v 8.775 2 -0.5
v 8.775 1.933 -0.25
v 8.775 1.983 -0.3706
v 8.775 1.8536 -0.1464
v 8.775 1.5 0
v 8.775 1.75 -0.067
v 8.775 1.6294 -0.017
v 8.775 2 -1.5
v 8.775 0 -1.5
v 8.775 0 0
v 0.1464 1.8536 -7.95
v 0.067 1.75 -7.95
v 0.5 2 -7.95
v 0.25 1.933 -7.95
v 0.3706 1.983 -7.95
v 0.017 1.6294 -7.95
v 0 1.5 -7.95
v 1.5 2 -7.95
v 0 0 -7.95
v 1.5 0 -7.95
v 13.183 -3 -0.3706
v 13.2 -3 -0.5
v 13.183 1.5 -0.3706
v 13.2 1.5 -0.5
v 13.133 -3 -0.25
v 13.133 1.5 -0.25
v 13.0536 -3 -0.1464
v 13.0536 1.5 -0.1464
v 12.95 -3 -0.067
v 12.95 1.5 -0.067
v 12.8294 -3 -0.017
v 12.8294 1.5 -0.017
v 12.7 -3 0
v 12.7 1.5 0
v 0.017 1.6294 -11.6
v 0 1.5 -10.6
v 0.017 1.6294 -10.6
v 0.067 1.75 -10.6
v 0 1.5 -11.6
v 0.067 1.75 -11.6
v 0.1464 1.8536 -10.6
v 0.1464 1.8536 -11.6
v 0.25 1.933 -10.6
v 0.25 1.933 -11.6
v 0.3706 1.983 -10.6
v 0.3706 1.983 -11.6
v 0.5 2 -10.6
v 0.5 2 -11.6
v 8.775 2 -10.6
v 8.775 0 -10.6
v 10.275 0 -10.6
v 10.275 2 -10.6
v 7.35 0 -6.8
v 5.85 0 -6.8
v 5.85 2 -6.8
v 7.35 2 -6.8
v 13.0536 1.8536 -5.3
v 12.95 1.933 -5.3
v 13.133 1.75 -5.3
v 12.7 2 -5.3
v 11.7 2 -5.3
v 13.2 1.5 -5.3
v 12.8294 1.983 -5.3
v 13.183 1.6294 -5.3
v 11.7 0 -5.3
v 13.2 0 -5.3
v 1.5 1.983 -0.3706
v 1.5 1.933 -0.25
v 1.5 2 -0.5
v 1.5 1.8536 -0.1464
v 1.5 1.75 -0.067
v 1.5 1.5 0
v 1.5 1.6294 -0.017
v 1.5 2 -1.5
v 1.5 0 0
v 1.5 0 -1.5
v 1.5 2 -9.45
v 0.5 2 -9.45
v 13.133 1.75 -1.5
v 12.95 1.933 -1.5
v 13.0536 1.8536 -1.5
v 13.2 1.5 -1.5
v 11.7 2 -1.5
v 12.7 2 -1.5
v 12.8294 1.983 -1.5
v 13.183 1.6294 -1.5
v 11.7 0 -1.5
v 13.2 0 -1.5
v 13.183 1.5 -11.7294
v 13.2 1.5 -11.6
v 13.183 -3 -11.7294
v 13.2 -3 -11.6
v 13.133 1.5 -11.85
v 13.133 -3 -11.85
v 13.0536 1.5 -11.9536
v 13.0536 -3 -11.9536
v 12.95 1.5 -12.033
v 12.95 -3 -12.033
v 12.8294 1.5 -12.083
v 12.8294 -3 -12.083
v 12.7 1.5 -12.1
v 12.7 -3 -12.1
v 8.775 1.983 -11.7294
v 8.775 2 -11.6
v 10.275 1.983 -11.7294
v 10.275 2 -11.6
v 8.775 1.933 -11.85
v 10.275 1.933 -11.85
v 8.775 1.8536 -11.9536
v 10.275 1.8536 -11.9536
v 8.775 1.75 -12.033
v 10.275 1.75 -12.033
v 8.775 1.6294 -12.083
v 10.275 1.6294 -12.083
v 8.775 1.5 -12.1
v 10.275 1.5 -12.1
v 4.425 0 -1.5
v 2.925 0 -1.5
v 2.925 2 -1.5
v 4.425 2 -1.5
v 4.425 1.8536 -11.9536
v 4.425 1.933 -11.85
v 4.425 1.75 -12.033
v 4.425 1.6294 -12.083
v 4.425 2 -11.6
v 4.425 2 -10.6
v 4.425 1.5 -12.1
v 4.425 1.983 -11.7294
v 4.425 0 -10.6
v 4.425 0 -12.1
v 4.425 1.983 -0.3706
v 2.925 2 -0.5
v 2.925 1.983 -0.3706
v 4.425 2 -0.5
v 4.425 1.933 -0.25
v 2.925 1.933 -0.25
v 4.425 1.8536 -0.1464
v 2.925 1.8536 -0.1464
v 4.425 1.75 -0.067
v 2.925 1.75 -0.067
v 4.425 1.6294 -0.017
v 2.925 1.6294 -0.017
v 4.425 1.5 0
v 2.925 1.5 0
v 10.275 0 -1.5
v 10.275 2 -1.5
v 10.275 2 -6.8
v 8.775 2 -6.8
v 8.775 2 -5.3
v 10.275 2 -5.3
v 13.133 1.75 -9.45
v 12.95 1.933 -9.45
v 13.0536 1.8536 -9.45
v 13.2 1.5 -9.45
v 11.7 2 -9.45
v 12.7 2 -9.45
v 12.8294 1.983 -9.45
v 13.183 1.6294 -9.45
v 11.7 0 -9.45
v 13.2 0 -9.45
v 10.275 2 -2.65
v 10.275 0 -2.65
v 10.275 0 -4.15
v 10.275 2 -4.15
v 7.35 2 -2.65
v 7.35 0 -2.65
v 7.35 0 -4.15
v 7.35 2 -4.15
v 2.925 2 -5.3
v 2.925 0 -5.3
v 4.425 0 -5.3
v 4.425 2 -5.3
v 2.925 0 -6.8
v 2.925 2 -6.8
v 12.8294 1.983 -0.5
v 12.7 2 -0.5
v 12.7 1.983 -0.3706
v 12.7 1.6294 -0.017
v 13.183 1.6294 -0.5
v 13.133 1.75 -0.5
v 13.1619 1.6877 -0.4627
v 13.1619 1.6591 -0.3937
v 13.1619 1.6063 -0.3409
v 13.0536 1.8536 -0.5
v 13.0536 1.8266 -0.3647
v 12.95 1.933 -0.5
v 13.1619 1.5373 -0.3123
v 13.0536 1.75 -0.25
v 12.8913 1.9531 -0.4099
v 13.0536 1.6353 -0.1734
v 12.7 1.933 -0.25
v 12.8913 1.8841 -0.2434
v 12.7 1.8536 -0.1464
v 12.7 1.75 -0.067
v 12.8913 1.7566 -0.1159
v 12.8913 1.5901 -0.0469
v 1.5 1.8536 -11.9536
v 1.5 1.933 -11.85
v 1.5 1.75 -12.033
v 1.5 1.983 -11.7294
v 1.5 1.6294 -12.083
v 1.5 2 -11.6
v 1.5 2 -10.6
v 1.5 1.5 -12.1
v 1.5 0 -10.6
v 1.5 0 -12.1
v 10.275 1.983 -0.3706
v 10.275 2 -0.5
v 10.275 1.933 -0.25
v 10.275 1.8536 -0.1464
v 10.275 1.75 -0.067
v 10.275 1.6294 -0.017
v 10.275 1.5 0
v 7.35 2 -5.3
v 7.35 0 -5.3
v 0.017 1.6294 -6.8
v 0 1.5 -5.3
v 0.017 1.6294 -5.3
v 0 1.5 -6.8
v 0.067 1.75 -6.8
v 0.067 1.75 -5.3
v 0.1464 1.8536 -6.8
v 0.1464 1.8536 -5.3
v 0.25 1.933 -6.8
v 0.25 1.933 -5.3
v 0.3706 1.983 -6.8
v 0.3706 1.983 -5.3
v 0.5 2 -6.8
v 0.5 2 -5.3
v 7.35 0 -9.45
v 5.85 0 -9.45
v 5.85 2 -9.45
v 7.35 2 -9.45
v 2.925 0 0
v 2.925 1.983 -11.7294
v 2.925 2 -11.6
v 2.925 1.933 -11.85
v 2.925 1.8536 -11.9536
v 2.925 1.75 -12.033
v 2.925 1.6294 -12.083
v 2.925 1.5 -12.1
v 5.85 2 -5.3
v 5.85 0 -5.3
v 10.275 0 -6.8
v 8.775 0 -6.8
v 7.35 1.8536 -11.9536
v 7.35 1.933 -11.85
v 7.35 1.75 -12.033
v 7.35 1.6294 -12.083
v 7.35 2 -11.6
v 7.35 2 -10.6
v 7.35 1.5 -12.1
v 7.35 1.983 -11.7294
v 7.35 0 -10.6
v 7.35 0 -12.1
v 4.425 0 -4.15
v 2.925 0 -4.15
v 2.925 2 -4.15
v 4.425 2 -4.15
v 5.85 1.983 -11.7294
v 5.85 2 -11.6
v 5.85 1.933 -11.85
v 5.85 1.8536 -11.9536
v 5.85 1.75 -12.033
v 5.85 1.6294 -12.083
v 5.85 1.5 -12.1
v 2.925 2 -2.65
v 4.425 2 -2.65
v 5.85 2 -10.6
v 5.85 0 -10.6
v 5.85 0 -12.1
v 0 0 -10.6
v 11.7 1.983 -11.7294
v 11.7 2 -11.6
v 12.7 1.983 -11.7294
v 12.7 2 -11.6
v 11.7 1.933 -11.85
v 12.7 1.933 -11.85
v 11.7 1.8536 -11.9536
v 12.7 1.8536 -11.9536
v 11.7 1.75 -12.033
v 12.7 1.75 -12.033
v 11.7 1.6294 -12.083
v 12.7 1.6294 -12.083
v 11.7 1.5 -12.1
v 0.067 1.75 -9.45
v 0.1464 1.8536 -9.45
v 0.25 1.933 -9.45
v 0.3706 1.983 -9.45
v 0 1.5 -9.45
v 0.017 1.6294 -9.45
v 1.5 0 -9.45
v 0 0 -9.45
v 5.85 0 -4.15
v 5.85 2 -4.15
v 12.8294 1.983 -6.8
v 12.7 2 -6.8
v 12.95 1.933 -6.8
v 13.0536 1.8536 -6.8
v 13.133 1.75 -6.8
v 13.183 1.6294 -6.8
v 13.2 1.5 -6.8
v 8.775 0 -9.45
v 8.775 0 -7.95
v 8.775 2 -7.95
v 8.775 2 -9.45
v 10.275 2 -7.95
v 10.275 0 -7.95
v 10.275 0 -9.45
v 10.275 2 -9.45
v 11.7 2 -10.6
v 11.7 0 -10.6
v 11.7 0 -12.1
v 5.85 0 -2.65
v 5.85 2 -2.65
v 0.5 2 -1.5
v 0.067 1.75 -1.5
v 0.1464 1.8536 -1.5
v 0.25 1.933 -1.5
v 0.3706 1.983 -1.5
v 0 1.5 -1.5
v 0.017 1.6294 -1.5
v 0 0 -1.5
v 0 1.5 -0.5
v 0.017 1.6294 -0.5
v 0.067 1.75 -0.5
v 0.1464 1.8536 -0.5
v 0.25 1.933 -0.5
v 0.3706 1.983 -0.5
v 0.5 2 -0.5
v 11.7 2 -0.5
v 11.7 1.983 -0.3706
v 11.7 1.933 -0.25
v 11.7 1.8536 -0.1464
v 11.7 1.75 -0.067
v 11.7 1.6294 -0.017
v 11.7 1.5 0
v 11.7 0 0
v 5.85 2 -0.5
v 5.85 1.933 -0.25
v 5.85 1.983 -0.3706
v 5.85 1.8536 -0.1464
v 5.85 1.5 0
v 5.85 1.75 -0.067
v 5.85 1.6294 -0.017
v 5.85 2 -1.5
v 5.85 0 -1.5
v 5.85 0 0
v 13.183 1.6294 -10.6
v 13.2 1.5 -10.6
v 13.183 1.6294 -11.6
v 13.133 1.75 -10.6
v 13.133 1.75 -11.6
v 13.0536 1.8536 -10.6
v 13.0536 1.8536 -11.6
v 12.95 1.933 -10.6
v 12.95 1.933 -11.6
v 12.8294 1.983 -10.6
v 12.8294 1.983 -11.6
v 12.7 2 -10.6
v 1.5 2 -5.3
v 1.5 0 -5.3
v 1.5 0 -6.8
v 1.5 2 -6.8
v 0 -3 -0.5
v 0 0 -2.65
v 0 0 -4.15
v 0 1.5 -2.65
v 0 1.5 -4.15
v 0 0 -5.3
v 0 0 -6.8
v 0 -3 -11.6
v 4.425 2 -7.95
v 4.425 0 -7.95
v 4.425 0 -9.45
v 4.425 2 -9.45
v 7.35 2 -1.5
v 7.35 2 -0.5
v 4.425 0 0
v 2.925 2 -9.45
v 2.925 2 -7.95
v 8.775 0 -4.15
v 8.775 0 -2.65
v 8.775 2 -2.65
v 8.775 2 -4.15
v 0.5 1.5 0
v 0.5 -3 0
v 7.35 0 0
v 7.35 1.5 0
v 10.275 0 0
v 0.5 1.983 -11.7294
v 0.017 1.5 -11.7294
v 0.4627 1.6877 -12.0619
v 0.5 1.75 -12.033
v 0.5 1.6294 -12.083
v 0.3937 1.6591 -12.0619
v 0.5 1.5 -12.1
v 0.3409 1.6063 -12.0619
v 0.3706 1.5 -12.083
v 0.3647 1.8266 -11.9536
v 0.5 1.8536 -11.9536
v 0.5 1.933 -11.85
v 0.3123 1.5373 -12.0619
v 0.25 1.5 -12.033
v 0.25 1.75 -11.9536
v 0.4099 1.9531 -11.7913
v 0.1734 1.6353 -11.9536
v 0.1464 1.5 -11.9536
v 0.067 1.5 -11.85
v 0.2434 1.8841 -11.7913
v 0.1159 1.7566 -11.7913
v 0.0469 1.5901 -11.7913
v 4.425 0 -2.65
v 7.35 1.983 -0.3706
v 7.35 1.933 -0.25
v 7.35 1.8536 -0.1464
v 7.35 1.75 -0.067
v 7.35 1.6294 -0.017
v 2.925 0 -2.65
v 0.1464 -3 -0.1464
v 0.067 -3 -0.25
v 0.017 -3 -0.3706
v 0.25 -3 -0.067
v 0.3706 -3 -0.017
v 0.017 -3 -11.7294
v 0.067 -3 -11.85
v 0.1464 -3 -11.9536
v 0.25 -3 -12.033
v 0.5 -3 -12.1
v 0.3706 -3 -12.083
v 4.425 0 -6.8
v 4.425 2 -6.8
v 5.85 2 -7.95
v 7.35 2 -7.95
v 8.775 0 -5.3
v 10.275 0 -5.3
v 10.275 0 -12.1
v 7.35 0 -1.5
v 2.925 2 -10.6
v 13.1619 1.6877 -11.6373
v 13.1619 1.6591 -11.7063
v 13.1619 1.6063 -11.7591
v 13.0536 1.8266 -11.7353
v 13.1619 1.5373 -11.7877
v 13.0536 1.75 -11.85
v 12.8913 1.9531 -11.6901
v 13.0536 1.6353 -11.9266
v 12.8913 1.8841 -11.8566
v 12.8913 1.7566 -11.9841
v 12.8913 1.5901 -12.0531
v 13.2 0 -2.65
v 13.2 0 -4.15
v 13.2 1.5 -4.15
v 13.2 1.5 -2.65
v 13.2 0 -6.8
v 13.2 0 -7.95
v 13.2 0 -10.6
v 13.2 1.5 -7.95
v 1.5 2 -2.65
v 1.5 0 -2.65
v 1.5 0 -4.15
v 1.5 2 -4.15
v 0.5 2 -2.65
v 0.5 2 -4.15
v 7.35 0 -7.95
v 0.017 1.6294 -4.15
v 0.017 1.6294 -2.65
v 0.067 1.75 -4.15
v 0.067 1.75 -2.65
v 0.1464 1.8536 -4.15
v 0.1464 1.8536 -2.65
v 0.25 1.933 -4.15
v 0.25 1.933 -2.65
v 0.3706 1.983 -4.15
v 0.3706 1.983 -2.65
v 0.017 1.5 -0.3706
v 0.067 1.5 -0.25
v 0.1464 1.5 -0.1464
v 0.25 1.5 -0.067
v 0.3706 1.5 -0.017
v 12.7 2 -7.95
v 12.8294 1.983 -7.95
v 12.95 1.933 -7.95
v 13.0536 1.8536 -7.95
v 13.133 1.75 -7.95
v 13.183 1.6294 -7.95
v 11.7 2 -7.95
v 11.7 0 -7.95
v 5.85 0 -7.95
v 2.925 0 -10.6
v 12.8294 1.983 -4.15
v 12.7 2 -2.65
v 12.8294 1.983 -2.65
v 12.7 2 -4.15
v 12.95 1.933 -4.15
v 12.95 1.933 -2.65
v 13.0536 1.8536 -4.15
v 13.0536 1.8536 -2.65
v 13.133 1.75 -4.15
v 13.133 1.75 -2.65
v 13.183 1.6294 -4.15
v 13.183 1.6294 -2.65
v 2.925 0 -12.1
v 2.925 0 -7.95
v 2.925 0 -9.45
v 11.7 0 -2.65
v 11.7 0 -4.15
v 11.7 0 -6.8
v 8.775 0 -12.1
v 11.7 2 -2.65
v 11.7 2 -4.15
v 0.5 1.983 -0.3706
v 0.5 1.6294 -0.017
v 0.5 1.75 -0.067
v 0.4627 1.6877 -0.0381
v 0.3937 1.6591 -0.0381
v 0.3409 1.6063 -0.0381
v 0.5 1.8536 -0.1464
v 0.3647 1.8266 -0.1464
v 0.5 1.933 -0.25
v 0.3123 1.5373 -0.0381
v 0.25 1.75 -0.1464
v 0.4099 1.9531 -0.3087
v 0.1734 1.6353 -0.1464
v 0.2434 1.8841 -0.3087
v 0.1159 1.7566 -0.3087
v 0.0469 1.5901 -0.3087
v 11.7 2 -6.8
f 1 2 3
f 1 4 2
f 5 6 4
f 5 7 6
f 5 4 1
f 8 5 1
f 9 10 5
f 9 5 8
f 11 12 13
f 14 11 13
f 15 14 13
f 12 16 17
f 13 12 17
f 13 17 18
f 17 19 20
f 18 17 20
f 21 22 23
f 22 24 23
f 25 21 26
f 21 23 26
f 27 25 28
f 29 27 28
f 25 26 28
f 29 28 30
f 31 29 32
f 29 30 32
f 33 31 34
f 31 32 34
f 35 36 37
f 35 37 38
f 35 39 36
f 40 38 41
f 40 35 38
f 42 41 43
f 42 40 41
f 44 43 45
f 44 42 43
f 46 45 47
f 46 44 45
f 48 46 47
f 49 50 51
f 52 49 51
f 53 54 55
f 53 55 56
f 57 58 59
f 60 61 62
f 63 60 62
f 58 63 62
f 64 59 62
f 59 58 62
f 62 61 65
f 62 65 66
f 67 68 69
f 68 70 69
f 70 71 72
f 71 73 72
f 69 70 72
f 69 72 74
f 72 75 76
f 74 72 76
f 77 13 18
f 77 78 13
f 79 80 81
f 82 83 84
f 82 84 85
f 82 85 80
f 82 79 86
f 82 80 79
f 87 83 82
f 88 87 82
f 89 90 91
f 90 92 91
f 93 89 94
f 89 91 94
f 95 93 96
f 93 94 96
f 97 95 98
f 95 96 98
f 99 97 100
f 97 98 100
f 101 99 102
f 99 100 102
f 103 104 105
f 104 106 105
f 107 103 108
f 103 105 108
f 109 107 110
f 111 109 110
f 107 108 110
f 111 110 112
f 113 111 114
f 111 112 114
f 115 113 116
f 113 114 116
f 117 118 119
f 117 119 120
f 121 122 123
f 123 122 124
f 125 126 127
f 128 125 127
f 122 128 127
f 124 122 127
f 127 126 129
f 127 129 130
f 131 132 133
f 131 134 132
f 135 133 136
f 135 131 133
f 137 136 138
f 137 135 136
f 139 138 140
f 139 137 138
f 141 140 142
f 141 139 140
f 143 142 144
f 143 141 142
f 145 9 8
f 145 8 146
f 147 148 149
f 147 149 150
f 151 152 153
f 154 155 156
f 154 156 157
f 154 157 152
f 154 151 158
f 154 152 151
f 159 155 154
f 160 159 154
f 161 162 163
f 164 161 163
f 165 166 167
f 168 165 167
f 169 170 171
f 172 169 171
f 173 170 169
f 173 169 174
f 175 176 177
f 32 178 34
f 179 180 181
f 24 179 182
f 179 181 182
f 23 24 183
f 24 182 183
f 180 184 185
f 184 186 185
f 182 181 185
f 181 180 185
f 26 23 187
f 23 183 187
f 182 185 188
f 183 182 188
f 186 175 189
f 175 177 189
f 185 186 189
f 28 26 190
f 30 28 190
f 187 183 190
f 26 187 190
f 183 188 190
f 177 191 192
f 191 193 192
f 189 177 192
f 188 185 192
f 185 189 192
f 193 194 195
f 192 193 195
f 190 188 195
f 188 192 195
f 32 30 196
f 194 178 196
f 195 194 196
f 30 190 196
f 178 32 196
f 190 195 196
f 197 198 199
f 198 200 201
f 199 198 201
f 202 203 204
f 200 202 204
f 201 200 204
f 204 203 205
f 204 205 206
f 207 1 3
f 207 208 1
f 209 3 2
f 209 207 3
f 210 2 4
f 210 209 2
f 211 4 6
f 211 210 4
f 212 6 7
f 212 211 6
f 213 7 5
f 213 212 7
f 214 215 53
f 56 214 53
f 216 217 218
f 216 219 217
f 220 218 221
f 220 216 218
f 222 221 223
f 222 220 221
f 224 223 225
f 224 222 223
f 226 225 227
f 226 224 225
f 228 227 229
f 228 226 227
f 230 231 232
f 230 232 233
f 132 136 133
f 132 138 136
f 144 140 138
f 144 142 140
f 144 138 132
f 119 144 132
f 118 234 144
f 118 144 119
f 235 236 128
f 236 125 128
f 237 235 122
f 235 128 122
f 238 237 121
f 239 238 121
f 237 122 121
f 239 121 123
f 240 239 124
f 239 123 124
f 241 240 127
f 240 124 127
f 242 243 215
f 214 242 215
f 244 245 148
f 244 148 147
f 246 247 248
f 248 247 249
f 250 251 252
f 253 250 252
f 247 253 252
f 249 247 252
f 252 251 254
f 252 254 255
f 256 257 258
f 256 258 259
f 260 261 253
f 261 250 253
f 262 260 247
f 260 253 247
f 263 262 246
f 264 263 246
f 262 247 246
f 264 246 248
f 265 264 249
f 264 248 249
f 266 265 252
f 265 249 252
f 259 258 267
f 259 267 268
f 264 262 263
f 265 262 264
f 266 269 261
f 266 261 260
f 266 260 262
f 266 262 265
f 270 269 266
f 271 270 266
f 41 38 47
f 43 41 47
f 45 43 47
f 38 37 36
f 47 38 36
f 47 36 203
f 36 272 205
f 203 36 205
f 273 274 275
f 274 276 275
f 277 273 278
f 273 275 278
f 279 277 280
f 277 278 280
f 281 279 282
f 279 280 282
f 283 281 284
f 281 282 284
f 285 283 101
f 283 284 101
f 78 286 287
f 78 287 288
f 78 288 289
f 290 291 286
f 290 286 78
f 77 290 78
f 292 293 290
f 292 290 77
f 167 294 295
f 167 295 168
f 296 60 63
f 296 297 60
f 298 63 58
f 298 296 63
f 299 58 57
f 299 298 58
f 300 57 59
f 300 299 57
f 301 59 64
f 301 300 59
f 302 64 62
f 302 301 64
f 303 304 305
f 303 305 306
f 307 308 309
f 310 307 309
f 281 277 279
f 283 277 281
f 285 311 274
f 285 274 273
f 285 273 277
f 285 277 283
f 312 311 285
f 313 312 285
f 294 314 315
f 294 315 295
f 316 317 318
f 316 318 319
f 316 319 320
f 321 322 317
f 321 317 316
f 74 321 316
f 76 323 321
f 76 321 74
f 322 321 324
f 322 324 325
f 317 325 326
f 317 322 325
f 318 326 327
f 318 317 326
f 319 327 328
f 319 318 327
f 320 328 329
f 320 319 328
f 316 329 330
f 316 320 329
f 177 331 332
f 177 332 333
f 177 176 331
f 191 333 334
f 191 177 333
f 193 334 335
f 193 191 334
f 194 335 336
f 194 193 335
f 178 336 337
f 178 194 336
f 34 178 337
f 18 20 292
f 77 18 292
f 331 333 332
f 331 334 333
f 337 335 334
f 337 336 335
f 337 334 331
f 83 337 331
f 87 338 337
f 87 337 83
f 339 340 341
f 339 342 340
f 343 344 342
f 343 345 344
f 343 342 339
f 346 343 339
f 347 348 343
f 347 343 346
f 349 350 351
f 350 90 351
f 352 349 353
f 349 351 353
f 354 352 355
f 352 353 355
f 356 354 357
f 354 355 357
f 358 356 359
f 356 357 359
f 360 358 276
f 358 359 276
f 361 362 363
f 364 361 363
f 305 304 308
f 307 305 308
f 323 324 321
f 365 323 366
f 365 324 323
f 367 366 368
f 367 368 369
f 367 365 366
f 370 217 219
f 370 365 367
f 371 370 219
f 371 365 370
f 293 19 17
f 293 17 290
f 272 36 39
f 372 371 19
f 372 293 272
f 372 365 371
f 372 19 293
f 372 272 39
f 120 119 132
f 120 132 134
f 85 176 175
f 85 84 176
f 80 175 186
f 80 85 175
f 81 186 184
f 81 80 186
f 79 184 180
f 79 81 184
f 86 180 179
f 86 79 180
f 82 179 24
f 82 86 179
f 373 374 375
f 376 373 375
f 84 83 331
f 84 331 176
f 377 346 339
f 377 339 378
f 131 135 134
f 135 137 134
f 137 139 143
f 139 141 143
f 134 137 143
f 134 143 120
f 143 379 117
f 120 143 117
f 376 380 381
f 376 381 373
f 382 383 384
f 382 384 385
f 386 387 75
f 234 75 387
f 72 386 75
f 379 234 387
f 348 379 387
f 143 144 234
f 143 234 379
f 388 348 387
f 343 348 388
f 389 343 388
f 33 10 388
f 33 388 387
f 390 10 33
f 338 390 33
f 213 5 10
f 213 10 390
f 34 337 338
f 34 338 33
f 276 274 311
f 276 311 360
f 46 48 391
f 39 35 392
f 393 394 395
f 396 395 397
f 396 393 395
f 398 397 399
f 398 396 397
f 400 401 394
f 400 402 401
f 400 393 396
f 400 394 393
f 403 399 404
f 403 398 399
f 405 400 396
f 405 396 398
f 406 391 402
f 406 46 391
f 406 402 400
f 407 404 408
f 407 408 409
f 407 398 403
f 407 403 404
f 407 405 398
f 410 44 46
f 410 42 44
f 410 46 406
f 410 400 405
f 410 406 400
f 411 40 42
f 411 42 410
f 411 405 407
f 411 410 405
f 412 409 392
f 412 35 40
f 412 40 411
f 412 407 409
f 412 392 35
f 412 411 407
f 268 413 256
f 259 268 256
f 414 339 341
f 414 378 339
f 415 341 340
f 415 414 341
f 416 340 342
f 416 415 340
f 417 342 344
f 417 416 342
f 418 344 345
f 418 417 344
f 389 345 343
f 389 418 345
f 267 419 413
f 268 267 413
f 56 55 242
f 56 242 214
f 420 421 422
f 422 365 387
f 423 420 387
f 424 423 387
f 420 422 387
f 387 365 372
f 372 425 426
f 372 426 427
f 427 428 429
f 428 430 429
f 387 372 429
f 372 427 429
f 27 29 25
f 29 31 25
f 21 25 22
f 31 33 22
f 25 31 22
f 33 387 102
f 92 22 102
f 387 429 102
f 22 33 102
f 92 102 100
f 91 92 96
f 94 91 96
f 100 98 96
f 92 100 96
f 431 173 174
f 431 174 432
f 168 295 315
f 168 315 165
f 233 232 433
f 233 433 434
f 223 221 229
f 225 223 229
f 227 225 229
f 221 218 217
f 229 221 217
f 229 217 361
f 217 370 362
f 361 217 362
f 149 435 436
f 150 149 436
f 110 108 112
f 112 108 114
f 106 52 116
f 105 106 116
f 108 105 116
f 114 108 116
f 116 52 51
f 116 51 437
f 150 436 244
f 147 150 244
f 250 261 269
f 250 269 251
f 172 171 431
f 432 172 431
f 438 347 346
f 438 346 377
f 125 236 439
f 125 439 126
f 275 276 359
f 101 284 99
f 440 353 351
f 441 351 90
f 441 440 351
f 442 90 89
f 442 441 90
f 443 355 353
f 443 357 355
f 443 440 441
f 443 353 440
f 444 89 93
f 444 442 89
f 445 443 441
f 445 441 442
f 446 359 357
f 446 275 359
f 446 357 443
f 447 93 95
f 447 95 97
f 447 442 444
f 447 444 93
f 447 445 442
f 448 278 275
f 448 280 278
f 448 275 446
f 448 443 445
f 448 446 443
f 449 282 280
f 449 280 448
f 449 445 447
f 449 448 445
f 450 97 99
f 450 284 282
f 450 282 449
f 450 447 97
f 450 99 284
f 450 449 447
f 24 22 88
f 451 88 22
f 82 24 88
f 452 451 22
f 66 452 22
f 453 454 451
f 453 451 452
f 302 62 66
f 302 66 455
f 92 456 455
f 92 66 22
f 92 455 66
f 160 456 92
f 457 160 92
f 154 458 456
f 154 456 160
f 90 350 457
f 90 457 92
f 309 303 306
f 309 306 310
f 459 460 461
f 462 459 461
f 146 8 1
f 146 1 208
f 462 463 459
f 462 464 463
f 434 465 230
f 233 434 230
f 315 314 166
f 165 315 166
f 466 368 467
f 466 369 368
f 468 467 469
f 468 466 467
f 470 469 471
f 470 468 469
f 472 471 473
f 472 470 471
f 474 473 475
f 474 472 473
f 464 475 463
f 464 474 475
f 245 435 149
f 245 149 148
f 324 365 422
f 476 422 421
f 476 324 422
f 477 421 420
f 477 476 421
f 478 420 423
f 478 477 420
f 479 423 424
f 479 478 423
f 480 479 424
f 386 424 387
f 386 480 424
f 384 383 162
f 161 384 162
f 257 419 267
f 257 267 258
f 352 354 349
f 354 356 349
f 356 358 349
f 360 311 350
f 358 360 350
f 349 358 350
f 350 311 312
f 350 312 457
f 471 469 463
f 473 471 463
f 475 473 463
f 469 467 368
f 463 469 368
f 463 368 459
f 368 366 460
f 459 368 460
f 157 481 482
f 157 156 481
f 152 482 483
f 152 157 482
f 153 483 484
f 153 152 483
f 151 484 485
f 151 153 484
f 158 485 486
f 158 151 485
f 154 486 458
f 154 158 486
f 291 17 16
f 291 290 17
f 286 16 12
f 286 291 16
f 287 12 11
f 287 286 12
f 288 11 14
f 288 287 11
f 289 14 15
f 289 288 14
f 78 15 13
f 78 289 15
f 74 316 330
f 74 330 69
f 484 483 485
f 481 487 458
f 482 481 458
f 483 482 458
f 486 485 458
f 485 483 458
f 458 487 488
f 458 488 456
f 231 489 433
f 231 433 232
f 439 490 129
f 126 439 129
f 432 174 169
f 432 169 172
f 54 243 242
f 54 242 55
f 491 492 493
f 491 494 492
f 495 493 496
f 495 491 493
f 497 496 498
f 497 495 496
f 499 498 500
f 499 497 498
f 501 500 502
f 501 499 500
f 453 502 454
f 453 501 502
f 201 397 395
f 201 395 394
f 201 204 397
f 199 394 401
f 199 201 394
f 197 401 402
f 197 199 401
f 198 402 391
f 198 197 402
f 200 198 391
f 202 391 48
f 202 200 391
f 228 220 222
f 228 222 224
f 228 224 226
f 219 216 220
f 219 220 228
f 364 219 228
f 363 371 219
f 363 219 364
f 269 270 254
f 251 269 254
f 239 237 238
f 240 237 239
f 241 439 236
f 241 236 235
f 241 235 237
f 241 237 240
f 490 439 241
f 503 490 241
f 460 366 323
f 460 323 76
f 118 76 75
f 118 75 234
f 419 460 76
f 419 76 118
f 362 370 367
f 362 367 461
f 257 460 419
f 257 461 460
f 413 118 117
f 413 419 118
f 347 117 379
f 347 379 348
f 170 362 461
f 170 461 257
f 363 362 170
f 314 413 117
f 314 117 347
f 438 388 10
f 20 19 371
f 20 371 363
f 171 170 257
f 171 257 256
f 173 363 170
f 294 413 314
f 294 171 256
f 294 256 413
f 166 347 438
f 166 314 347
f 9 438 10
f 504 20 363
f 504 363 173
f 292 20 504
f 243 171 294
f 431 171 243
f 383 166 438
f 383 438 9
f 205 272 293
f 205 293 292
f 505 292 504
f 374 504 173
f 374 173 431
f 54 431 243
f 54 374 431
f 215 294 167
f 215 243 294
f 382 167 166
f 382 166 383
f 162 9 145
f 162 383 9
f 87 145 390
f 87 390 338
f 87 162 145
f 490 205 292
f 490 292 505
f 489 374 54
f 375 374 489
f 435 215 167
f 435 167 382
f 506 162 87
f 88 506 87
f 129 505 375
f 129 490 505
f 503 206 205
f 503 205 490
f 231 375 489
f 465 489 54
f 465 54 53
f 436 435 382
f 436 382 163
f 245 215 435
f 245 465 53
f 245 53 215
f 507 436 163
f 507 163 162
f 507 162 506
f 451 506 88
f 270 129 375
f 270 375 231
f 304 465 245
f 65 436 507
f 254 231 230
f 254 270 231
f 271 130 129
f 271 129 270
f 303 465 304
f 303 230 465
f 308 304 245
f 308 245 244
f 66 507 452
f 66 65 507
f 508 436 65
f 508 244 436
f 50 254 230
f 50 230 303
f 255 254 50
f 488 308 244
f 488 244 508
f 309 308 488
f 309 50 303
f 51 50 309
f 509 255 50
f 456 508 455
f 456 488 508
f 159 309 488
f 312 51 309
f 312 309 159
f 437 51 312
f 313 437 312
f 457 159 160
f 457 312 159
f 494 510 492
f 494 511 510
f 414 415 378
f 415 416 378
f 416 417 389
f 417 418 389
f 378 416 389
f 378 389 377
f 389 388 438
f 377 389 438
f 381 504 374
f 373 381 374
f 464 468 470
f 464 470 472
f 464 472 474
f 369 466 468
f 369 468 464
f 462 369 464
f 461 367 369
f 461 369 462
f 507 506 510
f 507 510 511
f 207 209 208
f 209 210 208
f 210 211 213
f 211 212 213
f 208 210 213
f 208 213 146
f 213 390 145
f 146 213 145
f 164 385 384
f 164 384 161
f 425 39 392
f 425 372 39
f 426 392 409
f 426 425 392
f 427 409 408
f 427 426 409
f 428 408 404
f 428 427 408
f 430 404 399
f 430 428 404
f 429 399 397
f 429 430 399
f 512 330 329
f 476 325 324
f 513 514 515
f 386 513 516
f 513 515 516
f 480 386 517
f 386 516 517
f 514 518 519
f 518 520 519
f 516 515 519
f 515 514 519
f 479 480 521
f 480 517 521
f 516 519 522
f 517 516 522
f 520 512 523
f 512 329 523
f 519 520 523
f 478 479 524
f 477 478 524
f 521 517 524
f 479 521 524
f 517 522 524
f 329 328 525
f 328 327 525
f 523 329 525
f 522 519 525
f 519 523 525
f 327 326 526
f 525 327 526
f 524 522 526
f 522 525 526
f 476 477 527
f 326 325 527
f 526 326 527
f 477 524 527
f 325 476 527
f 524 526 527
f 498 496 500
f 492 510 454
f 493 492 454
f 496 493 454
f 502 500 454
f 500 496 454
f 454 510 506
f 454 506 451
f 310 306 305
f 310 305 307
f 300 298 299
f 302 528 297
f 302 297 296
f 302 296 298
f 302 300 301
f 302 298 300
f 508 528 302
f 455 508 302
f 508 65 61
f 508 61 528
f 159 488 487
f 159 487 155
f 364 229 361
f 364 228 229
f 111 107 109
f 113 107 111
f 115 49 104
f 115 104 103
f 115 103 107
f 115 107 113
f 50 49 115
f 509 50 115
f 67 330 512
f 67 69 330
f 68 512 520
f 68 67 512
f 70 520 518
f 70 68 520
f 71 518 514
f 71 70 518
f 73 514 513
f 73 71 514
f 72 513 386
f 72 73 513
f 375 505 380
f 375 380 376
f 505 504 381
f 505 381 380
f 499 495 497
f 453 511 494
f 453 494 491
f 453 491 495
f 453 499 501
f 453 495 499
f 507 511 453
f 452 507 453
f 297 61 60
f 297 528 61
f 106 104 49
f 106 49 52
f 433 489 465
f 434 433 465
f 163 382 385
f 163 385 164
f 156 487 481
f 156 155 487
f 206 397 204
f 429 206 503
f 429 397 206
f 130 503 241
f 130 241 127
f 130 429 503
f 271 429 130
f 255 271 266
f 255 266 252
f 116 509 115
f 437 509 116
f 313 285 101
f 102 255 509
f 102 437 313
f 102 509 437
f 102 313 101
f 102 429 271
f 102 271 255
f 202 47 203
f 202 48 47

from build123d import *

# Parameters (mm, degrees)
SKETCH1_W           = 13.2
SKETCH1_H           = 12.1
BOSS_EXTRUDE1_DEPTH = 3
SKETCH2_W           = 1.5
SKETCH2_H           = 1.5
BOSS_EXTRUDE2_DEPTH = 2
FILLET1_R           = 0.5


with BuildPart() as part:
    # Sketch1 → Boss-Extrude1 (new body)
    with BuildSketch(Plane(origin=(0, 0, 0), x_dir=(1, 0, 0), z_dir=(0, 1, 0))):
        with Locations((6.6, 6.05)):
            Rectangle(SKETCH1_W, SKETCH1_H)
    extrude(amount=-BOSS_EXTRUDE1_DEPTH)

    # Sketch2 → Boss-Extrude2 (add)
    with BuildSketch(Plane(origin=(0, 0, 0), x_dir=(1, 0, 0), z_dir=(0, 1, 0))):
        with Locations((3.675, 11.35)):
            Rectangle(SKETCH2_W, SKETCH2_H)
        with Locations((0.75, 11.35)):
            Rectangle(SKETCH2_W, SKETCH2_H)
        with Locations((6.6, 11.35)):
            Rectangle(SKETCH2_W, SKETCH2_H)
        with Locations((9.525, 11.35)):
            Rectangle(SKETCH2_W, SKETCH2_H)
        with Locations((12.45, 11.35)):
            Rectangle(SKETCH2_W, SKETCH2_H)
        with Locations((3.675, 8.7)):
            Rectangle(SKETCH2_W, SKETCH2_H)
        with Locations((6.6, 8.7)):
            Rectangle(SKETCH2_W, SKETCH2_H)
        with Locations((9.525, 8.7)):
            Rectangle(SKETCH2_W, SKETCH2_H)
        with Locations((12.45, 8.7)):
            Rectangle(SKETCH2_W, SKETCH2_H)
        with Locations((3.675, 6.05)):
            Rectangle(SKETCH2_W, SKETCH2_H)
        with Locations((6.6, 6.05)):
            Rectangle(SKETCH2_W, SKETCH2_H)
        with Locations((9.525, 6.05)):
            Rectangle(SKETCH2_W, SKETCH2_H)
        with Locations((12.45, 6.05)):
            Rectangle(SKETCH2_W, SKETCH2_H)
        with Locations((3.675, 3.4)):
            Rectangle(SKETCH2_W, SKETCH2_H)
        with Locations((6.6, 3.4)):
            Rectangle(SKETCH2_W, SKETCH2_H)
        with Locations((9.525, 3.4)):
            Rectangle(SKETCH2_W, SKETCH2_H)
        with Locations((12.45, 3.4)):
            Rectangle(SKETCH2_W, SKETCH2_H)
        with Locations((3.675, 0.75)):
            Rectangle(SKETCH2_W, SKETCH2_H)
        with Locations((6.6, 0.75)):
            Rectangle(SKETCH2_W, SKETCH2_H)
        with Locations((9.525, 0.75)):
            Rectangle(SKETCH2_W, SKETCH2_H)
        with Locations((12.45, 0.75)):
            Rectangle(SKETCH2_W, SKETCH2_H)
        with Locations((0.75, 8.7)):
            Rectangle(SKETCH2_W, SKETCH2_H)
        with Locations((0.75, 6.05)):
            Rectangle(SKETCH2_W, SKETCH2_H)
        with Locations((0.75, 3.4)):
            Rectangle(SKETCH2_W, SKETCH2_H)
        with Locations((0.75, 0.75)):
            Rectangle(SKETCH2_W, SKETCH2_H)
    extrude(amount=BOSS_EXTRUDE2_DEPTH)

    # Fillet1
    fillet1_edges = [part.edges().sort_by_distance(p)[0] for p in [
        (13.2, 2, -8.7),
        (13.2, 2, -6.05),
        (0, 2, -11.35),
        (0.75, 2, -12.1),
        (13.2, 2, -3.4),
        (3.675, 2, 0),
        (6.6, 2, 0),
        (9.525, 2, 0),
        (12.45, 2, 0),
        (13.2, 2, -0.75),
        (0, 2, -8.7),
        (0, 2, -6.05),
        (0, 2, -3.4),
        (0, 2, -0.75),
        (0.75, 2, 0),
        (3.675, 2, -12.1),
        (6.6, 2, -12.1),
        (9.525, 2, -12.1),
        (12.45, 2, -12.1),
        (13.2, 2, -11.35),
        (0, -0.5, -12.1),
        (13.2, -0.5, -12.1),
        (13.2, -0.5, 0),
        (0, -0.5, 0),
    ]]
    fillet(fillet1_edges, radius=FILLET1_R)


solid = part.part
